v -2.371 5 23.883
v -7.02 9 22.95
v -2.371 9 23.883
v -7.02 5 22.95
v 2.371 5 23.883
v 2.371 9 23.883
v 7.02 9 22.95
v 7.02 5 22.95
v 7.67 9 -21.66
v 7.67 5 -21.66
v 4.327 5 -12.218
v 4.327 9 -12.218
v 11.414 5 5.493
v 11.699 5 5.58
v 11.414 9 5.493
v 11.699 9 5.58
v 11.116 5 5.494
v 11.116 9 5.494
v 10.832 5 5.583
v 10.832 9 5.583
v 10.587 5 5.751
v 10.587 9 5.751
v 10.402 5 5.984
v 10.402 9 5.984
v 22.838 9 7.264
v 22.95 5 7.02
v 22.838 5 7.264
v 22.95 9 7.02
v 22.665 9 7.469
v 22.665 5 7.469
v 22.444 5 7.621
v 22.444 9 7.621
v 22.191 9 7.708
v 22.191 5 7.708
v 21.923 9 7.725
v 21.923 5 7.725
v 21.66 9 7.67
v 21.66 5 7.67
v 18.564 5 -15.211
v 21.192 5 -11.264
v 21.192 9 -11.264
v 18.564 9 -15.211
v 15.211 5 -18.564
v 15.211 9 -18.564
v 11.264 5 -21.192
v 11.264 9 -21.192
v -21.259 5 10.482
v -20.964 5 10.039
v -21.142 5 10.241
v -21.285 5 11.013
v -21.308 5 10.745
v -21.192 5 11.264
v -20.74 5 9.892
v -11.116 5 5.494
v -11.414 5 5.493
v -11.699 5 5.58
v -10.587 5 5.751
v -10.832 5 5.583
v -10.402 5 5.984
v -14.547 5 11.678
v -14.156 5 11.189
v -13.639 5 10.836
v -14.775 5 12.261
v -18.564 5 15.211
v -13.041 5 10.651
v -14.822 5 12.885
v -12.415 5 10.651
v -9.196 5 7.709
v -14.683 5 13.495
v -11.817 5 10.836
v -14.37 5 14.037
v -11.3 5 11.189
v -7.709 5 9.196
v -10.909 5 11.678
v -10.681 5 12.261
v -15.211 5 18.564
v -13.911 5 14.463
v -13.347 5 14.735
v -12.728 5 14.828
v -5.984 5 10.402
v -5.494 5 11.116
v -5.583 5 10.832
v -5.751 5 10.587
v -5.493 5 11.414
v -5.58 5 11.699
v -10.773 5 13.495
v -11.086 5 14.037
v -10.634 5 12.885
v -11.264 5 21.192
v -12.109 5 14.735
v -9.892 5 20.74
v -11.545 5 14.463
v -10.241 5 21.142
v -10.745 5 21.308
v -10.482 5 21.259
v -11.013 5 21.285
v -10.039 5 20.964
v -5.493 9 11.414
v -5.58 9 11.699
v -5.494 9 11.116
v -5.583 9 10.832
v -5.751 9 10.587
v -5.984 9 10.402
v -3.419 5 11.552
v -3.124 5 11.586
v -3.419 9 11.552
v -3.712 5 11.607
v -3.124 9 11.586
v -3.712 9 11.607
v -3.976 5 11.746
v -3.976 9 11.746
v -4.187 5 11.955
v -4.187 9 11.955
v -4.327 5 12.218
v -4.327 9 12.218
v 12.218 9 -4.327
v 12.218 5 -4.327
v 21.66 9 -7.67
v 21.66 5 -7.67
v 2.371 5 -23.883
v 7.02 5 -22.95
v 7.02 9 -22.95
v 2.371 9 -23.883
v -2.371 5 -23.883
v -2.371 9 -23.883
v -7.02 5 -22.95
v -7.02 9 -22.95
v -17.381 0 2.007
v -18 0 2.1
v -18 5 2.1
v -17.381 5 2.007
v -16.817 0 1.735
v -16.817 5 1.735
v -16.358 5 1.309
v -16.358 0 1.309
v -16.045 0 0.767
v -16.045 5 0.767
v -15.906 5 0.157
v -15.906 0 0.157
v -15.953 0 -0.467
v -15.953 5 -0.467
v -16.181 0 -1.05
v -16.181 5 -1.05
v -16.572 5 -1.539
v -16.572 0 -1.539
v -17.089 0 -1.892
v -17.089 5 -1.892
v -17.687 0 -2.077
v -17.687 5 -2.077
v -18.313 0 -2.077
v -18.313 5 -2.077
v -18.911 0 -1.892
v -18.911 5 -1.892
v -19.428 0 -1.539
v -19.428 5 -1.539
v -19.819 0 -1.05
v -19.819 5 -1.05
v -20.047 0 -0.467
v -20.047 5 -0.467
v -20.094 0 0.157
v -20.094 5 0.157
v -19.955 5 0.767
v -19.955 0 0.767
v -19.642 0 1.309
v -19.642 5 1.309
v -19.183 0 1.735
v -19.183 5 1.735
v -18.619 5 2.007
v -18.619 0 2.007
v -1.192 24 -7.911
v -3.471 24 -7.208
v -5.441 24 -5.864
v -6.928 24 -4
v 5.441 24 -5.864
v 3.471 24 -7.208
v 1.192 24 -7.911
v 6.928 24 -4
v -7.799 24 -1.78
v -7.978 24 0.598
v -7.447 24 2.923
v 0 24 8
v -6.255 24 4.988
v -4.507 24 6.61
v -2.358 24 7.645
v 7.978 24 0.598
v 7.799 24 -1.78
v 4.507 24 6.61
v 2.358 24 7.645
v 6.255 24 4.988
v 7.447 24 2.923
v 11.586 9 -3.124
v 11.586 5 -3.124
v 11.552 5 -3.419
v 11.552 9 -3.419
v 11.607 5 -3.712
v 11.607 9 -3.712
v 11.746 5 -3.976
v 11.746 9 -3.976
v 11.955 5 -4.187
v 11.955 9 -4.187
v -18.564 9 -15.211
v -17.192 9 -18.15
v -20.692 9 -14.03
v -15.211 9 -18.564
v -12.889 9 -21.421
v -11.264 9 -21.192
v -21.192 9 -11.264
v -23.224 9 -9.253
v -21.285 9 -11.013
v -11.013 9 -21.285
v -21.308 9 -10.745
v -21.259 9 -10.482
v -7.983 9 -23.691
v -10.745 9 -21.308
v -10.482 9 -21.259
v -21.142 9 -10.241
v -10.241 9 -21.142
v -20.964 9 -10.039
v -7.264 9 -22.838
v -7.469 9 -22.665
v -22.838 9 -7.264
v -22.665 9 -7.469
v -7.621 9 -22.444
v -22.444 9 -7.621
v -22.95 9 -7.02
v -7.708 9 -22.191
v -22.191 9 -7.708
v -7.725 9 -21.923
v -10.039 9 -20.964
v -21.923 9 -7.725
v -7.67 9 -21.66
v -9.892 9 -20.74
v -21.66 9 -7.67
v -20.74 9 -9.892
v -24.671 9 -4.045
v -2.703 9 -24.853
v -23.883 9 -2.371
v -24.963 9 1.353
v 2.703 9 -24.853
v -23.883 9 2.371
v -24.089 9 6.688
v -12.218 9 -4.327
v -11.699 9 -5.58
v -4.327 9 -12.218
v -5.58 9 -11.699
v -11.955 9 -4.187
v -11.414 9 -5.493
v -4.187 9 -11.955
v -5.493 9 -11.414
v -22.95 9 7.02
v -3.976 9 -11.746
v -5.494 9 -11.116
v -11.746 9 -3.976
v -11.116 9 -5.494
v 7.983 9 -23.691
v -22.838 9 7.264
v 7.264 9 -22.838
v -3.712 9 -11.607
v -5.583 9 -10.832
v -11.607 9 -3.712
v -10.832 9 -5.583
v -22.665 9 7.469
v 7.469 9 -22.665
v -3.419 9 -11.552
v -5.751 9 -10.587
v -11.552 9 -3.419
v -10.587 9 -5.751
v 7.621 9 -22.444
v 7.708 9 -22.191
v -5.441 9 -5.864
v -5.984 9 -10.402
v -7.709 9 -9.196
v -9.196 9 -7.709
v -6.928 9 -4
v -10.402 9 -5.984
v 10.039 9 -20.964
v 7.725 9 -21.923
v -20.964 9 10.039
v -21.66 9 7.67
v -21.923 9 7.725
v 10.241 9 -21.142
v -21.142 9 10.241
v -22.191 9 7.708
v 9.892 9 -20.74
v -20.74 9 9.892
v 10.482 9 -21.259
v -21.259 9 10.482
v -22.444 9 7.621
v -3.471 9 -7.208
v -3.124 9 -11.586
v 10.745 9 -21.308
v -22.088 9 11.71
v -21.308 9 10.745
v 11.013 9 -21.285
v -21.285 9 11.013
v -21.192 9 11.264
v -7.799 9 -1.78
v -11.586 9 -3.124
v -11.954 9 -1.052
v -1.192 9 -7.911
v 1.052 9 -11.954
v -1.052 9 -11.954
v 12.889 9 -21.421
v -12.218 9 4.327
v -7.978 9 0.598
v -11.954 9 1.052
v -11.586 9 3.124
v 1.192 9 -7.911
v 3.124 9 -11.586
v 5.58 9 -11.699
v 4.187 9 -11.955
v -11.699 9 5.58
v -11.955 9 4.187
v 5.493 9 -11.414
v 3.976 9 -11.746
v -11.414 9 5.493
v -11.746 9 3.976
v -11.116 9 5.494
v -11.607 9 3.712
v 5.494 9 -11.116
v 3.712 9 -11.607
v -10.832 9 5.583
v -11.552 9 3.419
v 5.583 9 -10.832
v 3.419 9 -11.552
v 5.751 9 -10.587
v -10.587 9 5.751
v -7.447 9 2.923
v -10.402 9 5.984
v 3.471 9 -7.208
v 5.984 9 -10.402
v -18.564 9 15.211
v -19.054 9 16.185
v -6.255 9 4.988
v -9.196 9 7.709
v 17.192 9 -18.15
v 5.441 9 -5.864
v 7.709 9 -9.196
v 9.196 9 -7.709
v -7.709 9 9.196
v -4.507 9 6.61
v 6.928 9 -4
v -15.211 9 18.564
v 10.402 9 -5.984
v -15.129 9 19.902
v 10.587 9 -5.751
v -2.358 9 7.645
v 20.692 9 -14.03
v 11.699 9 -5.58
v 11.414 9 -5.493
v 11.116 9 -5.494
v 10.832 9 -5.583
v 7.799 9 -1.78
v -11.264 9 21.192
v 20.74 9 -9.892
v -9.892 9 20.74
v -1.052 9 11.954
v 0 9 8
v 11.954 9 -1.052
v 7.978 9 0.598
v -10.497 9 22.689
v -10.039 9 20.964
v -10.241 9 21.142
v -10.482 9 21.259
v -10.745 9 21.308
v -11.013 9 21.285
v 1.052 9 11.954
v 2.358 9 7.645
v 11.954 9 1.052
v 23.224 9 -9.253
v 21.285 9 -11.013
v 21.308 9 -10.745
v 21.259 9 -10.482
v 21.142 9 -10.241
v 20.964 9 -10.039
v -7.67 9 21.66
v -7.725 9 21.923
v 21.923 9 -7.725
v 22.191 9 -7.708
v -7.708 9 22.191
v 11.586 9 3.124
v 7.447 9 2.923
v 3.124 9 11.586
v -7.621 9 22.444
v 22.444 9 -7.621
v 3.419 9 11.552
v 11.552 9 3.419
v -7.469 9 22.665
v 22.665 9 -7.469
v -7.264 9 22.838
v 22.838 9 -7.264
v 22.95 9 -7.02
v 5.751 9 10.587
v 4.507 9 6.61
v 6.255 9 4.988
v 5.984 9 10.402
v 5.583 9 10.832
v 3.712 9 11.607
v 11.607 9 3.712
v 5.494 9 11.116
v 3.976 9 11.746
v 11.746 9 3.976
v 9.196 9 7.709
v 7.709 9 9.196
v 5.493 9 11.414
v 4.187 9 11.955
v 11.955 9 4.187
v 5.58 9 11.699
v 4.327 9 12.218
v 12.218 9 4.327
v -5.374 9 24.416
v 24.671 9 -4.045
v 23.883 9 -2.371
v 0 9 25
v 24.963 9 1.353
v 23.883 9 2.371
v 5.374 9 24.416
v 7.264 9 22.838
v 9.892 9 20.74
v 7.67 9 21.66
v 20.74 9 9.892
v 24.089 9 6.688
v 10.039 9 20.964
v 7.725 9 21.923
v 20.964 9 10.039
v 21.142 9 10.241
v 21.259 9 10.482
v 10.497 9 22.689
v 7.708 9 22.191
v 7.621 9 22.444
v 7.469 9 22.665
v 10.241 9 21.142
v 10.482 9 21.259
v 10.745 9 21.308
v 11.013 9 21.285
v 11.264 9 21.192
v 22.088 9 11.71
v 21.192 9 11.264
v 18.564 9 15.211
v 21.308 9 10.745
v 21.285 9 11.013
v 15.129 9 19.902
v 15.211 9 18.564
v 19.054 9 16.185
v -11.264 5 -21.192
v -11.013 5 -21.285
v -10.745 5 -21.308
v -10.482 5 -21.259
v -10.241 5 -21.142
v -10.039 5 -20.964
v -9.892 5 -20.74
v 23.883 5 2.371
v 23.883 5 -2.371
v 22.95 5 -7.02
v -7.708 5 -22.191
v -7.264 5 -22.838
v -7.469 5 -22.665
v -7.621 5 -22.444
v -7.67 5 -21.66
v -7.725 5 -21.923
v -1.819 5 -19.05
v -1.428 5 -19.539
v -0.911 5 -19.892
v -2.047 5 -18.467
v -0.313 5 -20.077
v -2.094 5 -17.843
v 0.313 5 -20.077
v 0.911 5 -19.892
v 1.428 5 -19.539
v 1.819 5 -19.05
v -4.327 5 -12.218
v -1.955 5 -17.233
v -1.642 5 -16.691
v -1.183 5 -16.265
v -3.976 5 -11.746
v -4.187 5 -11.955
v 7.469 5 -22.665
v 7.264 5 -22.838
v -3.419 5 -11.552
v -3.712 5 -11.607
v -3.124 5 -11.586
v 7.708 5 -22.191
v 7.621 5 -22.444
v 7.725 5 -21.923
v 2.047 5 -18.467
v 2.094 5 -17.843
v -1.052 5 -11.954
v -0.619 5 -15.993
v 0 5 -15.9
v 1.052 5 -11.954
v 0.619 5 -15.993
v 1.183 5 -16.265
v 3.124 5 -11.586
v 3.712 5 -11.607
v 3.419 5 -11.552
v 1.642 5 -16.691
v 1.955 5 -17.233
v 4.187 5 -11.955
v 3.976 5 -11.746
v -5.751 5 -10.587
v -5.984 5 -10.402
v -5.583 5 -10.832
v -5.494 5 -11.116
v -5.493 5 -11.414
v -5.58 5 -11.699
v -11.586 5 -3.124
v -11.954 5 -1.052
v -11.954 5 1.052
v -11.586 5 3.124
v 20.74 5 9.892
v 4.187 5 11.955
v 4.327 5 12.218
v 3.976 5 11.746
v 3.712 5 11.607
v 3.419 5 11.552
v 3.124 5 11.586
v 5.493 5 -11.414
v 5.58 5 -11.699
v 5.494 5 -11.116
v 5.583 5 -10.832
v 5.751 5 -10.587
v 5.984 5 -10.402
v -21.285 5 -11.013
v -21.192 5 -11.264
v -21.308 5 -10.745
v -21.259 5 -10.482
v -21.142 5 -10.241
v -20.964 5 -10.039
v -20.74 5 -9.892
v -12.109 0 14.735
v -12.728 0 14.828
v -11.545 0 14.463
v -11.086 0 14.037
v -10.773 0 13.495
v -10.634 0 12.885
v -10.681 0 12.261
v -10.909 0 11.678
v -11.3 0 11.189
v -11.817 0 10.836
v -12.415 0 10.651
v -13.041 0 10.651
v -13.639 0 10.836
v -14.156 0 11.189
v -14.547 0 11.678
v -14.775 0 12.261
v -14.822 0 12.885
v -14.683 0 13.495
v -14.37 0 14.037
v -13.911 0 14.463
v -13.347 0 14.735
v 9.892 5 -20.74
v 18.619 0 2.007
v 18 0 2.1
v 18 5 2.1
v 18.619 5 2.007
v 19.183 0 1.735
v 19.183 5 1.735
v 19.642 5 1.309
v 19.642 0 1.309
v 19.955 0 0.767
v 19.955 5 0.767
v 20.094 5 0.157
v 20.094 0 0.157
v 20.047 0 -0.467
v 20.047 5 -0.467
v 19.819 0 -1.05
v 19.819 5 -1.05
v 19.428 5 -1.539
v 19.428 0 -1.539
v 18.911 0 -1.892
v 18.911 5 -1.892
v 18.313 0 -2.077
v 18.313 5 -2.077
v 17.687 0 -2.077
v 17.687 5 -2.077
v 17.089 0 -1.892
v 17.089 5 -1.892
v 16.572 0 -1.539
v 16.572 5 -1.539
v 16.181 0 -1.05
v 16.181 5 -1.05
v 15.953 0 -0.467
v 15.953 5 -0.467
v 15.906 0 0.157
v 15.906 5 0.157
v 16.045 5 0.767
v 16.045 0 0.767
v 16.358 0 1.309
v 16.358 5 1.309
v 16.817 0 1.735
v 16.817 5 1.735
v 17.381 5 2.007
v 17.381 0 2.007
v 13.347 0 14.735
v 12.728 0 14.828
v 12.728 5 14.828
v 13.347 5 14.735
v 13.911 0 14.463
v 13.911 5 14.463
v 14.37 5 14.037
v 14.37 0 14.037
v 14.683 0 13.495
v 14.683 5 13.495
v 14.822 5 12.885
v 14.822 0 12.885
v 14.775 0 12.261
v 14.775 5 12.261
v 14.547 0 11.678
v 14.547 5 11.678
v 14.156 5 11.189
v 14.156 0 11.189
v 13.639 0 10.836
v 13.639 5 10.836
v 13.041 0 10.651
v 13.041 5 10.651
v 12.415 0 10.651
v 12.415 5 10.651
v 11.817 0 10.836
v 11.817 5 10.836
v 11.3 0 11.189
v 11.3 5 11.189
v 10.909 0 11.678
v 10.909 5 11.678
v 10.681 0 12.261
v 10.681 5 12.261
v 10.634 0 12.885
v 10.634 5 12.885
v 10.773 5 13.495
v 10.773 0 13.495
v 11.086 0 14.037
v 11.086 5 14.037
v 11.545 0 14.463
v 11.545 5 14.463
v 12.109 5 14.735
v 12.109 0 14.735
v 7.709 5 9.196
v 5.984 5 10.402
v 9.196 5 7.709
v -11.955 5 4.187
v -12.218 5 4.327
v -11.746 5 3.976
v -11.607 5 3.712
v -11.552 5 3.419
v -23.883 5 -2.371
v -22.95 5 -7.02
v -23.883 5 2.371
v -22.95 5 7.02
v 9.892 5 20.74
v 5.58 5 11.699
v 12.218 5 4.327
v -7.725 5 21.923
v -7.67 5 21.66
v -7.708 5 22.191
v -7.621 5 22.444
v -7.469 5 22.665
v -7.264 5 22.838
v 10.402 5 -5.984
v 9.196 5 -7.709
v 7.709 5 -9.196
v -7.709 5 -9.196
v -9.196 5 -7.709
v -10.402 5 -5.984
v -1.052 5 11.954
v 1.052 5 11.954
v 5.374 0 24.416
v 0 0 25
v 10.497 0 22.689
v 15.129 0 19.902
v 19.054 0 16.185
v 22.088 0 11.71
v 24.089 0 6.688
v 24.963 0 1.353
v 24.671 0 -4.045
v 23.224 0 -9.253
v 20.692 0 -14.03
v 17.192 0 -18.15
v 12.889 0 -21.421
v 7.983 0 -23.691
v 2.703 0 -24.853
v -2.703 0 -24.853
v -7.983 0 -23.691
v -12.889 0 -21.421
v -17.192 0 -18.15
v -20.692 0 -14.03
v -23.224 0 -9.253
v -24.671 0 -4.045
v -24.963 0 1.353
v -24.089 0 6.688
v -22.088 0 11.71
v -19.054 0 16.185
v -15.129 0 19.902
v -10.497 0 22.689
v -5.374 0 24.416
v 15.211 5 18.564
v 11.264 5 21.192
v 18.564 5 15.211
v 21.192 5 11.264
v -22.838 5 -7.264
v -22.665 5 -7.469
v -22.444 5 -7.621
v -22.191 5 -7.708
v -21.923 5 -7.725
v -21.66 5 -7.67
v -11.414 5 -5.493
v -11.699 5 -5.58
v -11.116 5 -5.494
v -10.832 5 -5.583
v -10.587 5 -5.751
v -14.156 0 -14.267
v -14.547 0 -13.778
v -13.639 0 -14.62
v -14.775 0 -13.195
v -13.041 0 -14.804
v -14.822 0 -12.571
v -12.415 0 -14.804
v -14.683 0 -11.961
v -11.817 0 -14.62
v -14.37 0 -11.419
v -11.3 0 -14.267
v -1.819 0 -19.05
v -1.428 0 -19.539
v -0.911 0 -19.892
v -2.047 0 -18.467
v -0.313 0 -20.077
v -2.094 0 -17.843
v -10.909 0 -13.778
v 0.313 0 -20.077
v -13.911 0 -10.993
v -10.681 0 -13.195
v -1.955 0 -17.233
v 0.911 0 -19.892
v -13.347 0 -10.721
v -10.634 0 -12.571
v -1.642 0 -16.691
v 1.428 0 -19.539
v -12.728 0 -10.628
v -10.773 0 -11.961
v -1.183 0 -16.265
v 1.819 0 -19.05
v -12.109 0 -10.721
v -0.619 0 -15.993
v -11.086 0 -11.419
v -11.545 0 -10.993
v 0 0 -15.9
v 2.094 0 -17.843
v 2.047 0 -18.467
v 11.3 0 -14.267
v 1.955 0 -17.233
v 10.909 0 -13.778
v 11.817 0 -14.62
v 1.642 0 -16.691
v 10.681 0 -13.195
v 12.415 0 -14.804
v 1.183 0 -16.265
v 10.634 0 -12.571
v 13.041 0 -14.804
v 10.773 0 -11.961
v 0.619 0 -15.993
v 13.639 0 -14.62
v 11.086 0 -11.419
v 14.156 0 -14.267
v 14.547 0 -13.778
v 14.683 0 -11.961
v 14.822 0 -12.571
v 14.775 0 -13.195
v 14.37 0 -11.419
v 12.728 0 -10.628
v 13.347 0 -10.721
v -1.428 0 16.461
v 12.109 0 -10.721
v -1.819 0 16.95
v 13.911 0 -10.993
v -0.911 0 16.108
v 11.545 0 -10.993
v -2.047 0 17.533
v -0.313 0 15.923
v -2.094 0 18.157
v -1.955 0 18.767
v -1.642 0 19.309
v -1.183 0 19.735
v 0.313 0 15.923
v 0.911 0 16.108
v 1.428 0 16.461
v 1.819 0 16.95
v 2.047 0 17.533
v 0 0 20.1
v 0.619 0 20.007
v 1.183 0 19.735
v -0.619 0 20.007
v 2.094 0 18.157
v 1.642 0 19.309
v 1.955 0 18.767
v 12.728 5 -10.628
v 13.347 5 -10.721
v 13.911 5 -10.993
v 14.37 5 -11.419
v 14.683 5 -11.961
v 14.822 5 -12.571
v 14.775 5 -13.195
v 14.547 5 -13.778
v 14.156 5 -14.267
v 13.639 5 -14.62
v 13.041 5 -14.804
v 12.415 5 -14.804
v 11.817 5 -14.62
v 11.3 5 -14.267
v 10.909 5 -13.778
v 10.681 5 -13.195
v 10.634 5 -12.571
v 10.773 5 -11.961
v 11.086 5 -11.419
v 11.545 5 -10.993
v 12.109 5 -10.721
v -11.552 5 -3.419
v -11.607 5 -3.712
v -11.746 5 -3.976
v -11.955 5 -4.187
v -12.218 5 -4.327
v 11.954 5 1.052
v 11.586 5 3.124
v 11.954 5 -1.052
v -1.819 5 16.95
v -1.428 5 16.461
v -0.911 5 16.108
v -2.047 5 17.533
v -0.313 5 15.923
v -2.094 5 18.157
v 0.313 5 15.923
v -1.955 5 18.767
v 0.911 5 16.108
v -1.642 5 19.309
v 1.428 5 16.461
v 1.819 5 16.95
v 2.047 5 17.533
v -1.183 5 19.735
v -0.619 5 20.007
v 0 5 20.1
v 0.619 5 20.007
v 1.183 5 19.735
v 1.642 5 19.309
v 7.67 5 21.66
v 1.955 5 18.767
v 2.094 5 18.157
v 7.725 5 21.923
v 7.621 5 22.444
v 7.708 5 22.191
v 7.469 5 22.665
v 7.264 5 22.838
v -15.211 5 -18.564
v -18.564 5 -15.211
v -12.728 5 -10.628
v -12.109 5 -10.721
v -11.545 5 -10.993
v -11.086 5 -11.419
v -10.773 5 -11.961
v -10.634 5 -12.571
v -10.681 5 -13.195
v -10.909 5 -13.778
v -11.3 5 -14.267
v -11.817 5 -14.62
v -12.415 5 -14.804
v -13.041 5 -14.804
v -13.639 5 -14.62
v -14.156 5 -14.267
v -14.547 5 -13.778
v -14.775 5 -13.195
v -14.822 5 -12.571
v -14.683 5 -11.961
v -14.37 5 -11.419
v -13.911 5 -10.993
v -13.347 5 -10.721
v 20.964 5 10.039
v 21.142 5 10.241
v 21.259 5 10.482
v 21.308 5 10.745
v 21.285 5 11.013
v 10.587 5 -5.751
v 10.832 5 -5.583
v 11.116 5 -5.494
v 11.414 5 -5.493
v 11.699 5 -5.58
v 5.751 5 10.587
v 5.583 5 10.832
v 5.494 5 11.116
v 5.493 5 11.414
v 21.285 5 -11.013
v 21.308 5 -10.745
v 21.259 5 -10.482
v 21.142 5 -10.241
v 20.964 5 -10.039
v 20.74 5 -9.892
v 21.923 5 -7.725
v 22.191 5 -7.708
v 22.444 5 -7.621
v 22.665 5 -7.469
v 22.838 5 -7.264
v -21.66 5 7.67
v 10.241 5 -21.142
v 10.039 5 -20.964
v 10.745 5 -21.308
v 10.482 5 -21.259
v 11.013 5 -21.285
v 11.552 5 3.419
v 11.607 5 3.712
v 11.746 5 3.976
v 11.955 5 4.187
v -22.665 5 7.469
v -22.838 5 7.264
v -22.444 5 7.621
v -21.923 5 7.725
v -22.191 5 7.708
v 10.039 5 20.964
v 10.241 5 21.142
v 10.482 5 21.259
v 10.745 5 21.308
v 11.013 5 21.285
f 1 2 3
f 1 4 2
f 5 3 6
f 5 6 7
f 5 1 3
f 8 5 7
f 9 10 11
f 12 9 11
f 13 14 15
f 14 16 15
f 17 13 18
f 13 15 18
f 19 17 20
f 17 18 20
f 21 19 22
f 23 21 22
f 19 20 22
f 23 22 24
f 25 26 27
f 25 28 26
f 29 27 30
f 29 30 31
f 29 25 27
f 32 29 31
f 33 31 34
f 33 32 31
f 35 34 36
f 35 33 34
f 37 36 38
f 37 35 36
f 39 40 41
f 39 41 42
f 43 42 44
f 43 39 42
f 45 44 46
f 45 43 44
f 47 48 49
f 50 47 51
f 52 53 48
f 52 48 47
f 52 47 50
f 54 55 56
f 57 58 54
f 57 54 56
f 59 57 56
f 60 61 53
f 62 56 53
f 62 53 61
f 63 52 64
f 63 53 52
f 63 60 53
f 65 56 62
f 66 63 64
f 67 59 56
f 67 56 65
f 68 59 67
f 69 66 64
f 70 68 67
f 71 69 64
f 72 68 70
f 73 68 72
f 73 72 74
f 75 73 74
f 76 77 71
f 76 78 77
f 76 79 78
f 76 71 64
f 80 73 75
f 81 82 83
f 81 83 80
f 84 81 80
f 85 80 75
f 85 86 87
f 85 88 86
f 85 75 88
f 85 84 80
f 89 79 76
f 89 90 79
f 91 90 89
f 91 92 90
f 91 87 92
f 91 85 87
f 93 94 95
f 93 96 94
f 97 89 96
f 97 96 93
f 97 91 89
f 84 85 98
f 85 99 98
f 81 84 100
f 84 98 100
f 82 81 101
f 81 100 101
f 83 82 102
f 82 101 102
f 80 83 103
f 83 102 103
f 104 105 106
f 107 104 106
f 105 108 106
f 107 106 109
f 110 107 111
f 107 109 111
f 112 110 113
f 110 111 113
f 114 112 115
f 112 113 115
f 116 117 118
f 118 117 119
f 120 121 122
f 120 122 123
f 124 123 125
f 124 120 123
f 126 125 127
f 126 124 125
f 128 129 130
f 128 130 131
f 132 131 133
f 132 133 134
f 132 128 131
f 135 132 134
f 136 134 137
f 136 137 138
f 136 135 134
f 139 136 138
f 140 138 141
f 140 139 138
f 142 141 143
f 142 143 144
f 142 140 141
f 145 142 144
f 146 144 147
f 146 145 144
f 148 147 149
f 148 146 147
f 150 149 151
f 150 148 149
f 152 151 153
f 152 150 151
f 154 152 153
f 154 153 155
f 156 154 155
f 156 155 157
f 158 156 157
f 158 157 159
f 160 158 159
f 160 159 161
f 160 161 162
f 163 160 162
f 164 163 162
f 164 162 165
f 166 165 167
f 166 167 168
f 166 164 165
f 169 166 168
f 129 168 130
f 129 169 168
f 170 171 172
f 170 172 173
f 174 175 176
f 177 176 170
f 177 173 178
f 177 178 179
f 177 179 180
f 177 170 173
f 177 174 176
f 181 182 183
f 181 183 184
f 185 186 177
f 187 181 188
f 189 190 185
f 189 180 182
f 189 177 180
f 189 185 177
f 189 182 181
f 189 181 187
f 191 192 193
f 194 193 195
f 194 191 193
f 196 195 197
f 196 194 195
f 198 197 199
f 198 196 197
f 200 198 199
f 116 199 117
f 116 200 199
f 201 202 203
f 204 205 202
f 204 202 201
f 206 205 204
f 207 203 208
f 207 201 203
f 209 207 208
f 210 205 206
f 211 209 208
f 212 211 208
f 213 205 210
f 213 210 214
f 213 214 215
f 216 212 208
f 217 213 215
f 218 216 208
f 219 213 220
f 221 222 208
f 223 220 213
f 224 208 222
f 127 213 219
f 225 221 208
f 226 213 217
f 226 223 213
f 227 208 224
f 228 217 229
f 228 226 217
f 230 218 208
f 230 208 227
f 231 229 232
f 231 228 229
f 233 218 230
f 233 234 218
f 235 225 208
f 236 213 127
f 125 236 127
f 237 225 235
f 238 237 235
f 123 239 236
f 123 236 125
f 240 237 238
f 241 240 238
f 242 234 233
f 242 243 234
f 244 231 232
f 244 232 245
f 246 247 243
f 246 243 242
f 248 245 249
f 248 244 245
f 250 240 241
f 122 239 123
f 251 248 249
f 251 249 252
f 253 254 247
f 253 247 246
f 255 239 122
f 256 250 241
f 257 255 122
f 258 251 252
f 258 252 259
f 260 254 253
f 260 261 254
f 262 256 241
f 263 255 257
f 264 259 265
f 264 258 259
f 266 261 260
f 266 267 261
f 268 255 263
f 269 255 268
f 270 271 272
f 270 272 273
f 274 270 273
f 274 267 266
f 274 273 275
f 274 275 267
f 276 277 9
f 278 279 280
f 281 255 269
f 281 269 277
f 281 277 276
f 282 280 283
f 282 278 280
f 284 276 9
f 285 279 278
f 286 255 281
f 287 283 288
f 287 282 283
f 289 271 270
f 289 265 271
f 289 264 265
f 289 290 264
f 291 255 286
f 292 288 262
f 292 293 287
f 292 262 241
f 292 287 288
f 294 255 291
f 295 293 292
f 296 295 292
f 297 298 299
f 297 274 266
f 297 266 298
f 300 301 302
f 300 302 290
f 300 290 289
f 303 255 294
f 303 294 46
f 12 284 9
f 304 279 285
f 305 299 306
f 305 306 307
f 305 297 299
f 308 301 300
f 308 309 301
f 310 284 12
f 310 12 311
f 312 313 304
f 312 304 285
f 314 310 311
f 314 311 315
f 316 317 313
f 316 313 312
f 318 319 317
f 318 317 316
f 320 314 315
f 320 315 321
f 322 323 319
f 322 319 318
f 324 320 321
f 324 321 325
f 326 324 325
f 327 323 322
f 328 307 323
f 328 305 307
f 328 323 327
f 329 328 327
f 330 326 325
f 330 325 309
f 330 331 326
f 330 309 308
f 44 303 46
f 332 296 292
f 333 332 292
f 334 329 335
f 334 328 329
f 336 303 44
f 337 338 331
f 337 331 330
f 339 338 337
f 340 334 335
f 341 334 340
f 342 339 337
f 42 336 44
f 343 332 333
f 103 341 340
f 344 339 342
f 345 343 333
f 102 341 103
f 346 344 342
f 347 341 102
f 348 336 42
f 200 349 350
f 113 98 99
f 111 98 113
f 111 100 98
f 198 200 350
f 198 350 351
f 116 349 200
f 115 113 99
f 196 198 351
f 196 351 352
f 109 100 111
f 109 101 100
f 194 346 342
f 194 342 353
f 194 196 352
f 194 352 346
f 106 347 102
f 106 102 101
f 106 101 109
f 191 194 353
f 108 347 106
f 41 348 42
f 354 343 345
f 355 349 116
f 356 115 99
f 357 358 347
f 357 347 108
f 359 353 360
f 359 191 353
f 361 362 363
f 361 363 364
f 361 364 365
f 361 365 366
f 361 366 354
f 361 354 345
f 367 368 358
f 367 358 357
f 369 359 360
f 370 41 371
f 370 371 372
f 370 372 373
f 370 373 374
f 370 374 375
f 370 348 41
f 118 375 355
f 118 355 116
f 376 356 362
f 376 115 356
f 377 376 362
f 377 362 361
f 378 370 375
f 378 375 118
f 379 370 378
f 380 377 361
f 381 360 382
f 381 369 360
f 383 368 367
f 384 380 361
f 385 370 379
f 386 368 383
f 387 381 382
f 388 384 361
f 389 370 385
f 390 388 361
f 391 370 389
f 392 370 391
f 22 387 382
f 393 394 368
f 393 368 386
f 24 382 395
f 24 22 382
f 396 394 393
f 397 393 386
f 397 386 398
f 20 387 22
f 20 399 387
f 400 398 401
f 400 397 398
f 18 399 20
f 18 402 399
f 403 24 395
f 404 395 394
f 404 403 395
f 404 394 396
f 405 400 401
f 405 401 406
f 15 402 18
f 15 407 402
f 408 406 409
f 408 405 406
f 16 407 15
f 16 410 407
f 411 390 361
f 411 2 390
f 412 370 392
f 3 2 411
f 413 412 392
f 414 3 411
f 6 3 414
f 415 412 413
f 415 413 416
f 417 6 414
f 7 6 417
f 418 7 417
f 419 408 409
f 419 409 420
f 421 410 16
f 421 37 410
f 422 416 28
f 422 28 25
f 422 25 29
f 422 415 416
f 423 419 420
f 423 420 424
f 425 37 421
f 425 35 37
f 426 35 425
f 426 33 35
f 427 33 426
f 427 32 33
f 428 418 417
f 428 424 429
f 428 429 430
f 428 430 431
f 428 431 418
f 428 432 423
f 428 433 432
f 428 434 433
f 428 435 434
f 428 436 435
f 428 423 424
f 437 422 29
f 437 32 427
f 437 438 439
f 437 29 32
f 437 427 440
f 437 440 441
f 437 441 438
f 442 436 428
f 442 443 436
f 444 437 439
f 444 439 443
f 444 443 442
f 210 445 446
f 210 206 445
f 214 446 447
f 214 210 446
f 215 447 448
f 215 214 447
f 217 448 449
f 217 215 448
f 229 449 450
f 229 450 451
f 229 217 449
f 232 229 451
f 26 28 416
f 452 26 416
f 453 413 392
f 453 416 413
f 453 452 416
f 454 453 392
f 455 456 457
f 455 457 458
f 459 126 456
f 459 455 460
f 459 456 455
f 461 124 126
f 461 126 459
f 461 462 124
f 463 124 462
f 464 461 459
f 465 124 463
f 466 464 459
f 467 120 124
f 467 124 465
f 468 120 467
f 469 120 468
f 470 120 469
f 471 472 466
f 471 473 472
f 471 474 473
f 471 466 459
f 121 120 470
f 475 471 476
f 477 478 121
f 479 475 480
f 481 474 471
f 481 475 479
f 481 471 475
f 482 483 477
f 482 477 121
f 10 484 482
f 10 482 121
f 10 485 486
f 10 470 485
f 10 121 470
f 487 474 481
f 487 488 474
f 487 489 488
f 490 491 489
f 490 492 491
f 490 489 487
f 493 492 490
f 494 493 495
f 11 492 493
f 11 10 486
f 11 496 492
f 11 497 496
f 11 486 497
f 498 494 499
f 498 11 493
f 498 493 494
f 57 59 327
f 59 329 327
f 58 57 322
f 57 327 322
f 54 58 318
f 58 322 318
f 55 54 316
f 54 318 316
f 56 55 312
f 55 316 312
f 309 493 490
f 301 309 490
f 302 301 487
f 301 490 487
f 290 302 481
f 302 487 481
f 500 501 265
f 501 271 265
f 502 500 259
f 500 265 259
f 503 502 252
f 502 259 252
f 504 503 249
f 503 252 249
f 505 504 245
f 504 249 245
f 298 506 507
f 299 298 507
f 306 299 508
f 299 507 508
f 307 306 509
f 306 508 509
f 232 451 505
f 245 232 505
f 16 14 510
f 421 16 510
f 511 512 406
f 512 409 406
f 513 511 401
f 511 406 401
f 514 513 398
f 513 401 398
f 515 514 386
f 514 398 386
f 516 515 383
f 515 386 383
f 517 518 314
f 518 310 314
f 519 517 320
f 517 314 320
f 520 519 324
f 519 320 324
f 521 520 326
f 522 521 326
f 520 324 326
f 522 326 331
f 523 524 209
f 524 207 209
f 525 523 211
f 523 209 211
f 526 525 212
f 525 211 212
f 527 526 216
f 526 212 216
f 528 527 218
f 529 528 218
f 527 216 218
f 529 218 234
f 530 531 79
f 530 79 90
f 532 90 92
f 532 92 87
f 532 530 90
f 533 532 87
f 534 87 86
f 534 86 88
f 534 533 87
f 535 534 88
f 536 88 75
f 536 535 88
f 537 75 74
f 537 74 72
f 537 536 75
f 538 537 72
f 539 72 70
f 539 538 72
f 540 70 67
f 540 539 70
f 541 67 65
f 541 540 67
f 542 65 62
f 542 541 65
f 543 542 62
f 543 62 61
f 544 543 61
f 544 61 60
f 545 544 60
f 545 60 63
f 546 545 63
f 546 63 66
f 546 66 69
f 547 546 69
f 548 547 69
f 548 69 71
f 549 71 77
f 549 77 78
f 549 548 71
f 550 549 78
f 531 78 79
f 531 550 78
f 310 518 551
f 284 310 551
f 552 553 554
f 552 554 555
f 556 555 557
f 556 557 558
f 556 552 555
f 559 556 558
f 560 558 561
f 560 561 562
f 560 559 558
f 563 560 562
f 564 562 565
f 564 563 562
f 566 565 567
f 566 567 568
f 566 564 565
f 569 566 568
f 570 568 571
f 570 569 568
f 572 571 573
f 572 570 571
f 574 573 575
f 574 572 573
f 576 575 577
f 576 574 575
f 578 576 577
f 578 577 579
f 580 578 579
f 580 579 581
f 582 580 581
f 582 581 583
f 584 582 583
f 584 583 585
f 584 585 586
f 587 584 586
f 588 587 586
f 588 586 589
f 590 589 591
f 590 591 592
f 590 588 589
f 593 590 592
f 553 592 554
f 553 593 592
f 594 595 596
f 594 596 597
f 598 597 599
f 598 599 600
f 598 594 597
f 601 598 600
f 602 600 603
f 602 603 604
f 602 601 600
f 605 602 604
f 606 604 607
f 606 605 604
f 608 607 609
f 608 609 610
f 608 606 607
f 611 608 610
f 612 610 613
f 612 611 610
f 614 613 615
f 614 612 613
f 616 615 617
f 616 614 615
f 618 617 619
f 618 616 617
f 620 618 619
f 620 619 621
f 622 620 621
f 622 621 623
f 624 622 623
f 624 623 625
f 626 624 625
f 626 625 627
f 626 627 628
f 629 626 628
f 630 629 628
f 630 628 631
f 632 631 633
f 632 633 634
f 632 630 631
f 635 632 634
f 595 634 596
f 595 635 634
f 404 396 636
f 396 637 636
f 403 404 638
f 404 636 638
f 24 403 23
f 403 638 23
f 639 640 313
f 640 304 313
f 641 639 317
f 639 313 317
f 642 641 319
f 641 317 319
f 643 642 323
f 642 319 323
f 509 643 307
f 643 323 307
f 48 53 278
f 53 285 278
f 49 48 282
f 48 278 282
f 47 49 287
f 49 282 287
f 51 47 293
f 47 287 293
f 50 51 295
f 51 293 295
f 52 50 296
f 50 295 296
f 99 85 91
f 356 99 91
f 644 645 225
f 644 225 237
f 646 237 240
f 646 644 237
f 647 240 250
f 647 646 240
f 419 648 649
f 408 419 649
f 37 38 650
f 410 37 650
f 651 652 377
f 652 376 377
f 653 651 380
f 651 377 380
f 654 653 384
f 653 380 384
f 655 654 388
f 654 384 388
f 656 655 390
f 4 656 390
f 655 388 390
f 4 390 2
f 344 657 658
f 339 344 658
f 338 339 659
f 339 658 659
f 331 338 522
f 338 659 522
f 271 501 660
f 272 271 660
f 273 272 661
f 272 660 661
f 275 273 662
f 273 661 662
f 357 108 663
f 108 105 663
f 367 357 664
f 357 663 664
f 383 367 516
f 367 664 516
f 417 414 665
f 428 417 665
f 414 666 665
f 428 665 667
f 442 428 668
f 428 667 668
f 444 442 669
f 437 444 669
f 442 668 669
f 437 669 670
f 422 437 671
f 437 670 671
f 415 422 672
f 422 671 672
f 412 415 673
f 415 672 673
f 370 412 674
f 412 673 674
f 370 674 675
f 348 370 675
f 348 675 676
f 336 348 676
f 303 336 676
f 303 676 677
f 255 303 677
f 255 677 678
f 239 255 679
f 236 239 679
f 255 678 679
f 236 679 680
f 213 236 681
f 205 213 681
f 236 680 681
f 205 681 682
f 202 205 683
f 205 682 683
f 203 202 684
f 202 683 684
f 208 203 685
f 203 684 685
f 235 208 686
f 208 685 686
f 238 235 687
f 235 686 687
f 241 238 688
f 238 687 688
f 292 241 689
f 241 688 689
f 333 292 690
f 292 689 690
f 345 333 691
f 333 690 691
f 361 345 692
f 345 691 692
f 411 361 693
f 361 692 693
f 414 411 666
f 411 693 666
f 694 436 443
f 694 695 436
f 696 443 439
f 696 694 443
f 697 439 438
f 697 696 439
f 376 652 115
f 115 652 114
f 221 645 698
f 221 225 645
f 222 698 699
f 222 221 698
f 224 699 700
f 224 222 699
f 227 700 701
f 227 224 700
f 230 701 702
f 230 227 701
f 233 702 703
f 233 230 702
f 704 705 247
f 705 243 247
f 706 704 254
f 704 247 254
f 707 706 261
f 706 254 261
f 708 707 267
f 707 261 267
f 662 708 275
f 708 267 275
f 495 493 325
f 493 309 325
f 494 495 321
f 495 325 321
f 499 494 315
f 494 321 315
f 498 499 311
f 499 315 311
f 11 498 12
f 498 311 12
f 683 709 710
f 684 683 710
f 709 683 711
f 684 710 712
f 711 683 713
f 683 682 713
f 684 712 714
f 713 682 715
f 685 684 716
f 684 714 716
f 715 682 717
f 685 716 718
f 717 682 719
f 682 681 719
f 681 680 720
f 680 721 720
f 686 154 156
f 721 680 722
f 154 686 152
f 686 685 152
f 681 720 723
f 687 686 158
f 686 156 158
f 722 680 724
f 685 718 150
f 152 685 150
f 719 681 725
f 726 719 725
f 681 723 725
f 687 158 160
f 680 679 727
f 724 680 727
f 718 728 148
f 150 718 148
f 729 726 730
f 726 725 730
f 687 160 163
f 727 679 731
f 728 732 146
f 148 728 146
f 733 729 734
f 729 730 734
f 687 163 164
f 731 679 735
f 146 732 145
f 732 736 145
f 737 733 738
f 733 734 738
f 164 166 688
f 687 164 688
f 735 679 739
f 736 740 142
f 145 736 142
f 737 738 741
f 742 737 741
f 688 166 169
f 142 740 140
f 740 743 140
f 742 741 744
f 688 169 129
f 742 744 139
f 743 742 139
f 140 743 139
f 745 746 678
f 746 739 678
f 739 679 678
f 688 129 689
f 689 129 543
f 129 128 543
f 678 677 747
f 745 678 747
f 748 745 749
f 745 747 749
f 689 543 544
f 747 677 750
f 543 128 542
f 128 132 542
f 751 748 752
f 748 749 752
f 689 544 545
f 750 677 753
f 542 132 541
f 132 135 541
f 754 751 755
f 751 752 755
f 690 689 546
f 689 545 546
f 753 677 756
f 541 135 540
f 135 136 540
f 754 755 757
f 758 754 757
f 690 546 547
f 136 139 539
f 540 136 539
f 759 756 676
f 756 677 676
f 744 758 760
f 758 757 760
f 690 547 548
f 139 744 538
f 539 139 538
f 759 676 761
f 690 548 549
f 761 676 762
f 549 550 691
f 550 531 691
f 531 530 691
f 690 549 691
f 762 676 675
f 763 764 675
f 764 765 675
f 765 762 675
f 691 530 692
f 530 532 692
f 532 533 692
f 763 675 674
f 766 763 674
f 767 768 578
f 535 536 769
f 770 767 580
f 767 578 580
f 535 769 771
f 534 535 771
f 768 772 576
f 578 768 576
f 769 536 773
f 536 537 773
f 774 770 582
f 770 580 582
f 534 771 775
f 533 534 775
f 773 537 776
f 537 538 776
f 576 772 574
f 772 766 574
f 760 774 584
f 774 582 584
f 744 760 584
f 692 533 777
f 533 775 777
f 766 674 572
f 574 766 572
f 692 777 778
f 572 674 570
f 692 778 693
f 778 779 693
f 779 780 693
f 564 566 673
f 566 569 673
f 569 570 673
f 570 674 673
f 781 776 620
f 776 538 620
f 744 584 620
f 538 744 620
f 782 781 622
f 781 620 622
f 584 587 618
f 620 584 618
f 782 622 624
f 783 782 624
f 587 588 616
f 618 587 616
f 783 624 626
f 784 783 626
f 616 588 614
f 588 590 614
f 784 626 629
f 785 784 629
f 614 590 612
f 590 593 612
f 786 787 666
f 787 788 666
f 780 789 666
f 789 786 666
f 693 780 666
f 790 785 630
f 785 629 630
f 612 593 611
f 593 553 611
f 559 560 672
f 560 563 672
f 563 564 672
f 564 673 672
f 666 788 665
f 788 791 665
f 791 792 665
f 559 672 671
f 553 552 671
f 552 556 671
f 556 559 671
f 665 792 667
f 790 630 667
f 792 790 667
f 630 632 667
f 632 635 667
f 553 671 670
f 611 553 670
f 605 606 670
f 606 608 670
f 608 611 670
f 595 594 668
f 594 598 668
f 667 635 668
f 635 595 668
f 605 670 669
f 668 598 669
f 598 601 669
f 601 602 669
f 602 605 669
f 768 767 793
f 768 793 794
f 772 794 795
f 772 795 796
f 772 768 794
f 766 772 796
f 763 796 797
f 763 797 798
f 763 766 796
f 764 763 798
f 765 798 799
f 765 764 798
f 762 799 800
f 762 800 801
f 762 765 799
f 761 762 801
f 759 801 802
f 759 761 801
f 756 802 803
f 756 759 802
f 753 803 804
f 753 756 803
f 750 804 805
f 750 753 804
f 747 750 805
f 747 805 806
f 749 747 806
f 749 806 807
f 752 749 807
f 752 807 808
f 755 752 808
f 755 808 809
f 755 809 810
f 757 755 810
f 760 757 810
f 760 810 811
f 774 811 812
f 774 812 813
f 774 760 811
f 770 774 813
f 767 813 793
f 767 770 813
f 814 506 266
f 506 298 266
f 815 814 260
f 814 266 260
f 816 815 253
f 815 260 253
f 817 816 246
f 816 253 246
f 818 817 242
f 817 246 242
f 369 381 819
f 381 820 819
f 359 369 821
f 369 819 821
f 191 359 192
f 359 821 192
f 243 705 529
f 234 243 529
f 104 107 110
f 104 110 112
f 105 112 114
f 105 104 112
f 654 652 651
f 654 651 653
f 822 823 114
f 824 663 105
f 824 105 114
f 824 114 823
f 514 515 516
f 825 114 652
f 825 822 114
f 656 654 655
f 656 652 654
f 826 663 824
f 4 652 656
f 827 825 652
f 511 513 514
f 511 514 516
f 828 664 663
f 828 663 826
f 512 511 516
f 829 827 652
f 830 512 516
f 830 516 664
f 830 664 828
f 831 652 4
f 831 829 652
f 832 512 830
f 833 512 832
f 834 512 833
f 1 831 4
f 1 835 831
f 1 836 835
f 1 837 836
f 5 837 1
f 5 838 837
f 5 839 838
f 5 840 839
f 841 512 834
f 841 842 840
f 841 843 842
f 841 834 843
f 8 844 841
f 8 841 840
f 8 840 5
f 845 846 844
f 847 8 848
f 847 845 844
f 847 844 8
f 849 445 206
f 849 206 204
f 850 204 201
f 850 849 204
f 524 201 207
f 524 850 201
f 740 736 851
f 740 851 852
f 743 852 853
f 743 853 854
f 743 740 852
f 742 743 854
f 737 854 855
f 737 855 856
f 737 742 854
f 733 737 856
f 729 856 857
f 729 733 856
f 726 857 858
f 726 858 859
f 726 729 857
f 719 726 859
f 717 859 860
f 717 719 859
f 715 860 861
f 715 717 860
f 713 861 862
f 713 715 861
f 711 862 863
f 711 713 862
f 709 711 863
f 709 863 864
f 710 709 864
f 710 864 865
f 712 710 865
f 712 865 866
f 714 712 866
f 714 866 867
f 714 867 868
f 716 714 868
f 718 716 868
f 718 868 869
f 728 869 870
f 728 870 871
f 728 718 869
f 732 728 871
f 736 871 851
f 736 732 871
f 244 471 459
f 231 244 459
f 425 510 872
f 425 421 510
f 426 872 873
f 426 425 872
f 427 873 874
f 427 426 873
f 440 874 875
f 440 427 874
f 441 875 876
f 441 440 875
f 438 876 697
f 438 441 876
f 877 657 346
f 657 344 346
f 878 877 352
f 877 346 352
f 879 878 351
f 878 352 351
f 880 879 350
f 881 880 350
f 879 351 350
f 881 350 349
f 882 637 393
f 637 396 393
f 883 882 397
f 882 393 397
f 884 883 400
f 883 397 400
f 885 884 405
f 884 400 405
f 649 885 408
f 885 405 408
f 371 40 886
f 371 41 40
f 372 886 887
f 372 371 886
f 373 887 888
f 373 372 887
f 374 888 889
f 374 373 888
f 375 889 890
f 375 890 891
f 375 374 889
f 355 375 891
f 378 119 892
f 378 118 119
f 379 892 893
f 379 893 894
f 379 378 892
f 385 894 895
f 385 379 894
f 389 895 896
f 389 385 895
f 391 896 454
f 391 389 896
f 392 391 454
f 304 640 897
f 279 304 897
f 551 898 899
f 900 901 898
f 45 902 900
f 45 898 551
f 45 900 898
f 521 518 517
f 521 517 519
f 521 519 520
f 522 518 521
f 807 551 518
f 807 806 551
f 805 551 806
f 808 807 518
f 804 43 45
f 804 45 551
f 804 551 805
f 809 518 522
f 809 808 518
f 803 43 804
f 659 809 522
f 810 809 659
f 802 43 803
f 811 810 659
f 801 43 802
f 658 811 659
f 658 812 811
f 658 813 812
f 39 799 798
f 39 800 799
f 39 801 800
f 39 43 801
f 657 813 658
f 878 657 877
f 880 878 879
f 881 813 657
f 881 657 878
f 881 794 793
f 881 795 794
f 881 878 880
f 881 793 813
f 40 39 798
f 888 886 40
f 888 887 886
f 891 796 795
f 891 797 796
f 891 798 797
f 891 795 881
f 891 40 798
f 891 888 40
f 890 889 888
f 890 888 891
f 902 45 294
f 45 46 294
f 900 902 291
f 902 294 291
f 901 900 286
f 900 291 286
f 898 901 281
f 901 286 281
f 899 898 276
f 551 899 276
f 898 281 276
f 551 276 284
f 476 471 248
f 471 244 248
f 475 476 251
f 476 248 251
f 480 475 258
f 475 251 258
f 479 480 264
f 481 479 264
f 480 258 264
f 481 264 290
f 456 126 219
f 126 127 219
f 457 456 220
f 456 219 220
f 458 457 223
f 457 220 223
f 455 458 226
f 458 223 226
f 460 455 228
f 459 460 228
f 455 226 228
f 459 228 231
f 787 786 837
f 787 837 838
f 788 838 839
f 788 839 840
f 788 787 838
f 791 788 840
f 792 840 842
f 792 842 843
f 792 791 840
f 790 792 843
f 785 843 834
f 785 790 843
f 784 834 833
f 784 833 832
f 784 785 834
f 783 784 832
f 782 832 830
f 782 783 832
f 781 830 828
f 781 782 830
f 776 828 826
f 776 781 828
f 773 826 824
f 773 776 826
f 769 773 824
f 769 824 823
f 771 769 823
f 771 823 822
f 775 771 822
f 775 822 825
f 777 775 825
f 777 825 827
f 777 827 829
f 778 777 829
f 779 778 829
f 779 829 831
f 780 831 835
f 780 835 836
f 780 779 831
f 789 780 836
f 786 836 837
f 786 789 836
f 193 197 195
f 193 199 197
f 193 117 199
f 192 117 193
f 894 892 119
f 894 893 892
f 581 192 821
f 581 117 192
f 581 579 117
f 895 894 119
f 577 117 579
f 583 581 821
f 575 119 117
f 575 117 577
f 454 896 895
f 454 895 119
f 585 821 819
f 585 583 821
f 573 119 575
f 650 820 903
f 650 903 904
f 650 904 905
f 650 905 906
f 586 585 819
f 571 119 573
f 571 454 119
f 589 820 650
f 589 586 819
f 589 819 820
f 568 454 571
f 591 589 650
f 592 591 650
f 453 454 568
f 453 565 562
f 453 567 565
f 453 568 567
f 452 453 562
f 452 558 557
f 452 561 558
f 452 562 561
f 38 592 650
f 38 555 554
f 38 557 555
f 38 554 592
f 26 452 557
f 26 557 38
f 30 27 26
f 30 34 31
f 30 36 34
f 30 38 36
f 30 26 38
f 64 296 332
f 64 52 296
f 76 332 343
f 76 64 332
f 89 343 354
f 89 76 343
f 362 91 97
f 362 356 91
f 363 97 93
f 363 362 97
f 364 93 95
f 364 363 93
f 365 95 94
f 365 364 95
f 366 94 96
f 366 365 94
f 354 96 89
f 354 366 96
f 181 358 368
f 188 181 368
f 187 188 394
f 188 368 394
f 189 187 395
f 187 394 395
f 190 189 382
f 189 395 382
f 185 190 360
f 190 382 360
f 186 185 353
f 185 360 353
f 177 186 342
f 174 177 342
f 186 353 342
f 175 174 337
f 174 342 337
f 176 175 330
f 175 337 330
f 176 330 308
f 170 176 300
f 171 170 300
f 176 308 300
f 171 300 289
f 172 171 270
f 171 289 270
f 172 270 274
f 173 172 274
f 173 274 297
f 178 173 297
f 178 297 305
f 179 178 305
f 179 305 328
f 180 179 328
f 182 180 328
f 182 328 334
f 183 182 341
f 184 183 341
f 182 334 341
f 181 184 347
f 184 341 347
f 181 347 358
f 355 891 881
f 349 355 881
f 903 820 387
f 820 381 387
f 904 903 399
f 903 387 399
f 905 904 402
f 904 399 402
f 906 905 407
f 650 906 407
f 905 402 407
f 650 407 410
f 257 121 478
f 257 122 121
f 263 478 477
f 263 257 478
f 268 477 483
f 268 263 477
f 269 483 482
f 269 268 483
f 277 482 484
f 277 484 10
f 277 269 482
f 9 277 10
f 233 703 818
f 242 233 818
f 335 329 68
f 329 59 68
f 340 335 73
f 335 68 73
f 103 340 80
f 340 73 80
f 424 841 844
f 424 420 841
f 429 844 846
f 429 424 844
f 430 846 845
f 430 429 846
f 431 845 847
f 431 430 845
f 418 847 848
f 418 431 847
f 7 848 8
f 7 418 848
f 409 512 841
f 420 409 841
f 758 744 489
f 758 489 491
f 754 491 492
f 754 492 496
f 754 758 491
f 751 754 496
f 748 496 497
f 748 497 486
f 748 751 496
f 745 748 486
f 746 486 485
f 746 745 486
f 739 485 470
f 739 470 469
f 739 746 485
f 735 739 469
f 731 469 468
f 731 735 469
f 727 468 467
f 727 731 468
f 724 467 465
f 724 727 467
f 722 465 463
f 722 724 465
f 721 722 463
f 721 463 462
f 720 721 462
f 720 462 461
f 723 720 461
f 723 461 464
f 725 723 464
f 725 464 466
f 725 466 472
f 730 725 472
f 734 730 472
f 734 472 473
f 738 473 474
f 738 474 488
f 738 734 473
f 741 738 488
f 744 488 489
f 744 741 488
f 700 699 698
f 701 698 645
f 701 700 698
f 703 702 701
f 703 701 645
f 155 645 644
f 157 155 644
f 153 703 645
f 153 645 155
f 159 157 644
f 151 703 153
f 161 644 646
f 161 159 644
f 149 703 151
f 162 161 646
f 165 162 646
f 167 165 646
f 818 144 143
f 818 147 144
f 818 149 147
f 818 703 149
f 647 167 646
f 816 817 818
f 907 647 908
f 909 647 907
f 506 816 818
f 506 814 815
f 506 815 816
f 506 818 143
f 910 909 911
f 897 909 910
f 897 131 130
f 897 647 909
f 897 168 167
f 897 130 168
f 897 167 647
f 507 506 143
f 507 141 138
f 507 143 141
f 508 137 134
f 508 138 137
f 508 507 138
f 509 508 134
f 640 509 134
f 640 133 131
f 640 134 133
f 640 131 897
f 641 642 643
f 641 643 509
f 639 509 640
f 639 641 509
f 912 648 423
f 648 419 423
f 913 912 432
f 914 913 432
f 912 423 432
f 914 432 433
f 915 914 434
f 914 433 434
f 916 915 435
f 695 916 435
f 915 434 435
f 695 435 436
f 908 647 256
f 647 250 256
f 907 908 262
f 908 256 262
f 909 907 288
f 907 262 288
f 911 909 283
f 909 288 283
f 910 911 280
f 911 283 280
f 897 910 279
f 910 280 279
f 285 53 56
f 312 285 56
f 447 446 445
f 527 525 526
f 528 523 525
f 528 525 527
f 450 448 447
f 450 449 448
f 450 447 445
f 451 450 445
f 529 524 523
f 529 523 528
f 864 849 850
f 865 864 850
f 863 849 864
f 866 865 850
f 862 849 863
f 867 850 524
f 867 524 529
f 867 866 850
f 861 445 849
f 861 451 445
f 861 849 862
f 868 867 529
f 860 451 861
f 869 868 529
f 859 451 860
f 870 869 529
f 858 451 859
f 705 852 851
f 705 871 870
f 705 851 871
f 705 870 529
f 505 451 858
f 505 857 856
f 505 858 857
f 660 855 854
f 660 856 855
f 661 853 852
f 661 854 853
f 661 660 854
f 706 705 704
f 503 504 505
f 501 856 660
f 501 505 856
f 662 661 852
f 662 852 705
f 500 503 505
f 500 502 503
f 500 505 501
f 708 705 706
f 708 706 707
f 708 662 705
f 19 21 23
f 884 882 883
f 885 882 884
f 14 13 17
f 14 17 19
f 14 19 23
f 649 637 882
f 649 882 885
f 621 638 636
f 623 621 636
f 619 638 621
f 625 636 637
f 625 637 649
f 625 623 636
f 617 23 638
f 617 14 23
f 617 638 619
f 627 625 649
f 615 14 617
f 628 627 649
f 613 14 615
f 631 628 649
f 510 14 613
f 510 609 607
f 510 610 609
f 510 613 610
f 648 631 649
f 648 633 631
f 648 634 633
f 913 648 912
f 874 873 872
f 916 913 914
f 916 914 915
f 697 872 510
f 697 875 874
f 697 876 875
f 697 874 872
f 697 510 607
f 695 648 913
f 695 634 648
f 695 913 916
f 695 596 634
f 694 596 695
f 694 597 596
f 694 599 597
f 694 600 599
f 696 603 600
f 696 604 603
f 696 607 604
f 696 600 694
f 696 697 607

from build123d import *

# Parameters (mm, degrees)
SKETCH_1_R      = 25
SKETCH_1_R_2    = 2.1
EXTRUDE_1_DEPTH = 5
SKETCH_2_R      = 25
SKETCH_2_R_2    = 24
SKETCH_2_R_3    = 12
EXTRUDE_2_DEPTH = 4
FILLET_1_R      = 1
SKETCH_3_R      = 8
EXTRUDE_3_DEPTH = 15


with BuildPart() as part:
    # Эскиз1 → Бобышка-Вытянуть1 (new body)
    with BuildSketch(Plane(origin=(0, 0, 0), x_dir=(1, 0, 0), z_dir=(0, 1, 0))):
        with Locations(Location((0, 0, 0), (0, 0, 270))):
            Circle(SKETCH_1_R)
        with Locations(Location((-18, 0, 0), (0, 0, 270))):
            Circle(SKETCH_1_R_2, mode=Mode.SUBTRACT)
        with Locations(Location((-12.727922061, 12.727922061, 0), (0, 0, 270))):
            Circle(SKETCH_1_R_2, mode=Mode.SUBTRACT)
        with Locations(Location((0, 18, 0), (0, 0, 270))):
            Circle(SKETCH_1_R_2, mode=Mode.SUBTRACT)
        with Locations(Location((12.727922061, 12.727922061, 0), (0, 0, 270))):
            Circle(SKETCH_1_R_2, mode=Mode.SUBTRACT)
        with Locations(Location((18, 0, 0), (0, 0, 270))):
            Circle(SKETCH_1_R_2, mode=Mode.SUBTRACT)
        with Locations(Location((12.727922061, -12.727922061, 0), (0, 0, 270))):
            Circle(SKETCH_1_R_2, mode=Mode.SUBTRACT)
        with Locations(Location((0, -18, 0), (0, 0, 270))):
            Circle(SKETCH_1_R_2, mode=Mode.SUBTRACT)
        with Locations(Location((-12.727922061, -12.727922061, 0), (0, 0, 270))):
            Circle(SKETCH_1_R_2, mode=Mode.SUBTRACT)
    extrude(amount=EXTRUDE_1_DEPTH)

    # Эскиз2 → Бобышка-Вытянуть2 (add)
    # profile 1 of 10: a face of its own
    with BuildSketch(Plane(origin=(0, 5, 0), x_dir=(1, 0, 0), z_dir=(0, 1, 0))):
        with Locations(Location((0, 0, 0), (0, 0, 270))):
            Circle(SKETCH_2_R)
        Circle(SKETCH_2_R_2, mode=Mode.SUBTRACT)
    # profile 2 of 10: a face of its own
    with BuildSketch(Plane(origin=(0, 5, 0), x_dir=(1, 0, 0), z_dir=(0, 1, 0))):
        Circle(SKETCH_2_R_3)
    # profile 3 of 10: a face of its own
    with BuildSketch(Plane(origin=(0, 5, 0), x_dir=(1, 0, 0), z_dir=(0, 1, 0))):
        with BuildLine():
            Line((-10.332266323, 21.662046824), (-5.166133162, 10.831023412))
            ThreePointArc((-5.166133162, 10.831023412), (-4.592201188, 11.08655439), (-4.005682311, 11.311697893))
            Line((-4.005682311, 11.311697893), (-8.011364622, 22.623395786))
            ThreePointArc((-8.011364622, 22.623395786), (-9.184402377, 22.17310878), (-10.332266323, 21.662046824))
        make_face()
    # profile 4 of 10: a face of its own
    with BuildSketch(Plane(origin=(0, 5, 0), x_dir=(1, 0, 0), z_dir=(0, 1, 0))):
        with BuildLine():
            Line((8.011364622, 22.623395786), (4.005682311, 11.311697893))
            ThreePointArc((4.005682311, 11.311697893), (4.592201188, 11.08655439), (5.166133162, 10.831023412))
            Line((5.166133162, 10.831023412), (10.332266323, 21.662046824))
            ThreePointArc((10.332266323, 21.662046824), (9.184402377, 22.17310878), (8.011364622, 22.623395786))
        make_face()
    # profile 5 of 10: a face of its own
    with BuildSketch(Plane(origin=(0, 5, 0), x_dir=(1, 0, 0), z_dir=(0, 1, 0))):
        with BuildLine():
            ThreePointArc((10.831023412, 5.166133162), (11.08655439, 4.592201188), (11.311697893, 4.005682311))
            Line((11.311697893, 4.005682311), (22.623395786, 8.011364622))
            ThreePointArc((22.623395786, 8.011364622), (22.17310878, 9.184402377), (21.662046824, 10.332266323))
            Line((21.662046824, 10.332266323), (10.831023412, 5.166133162))
        make_face()
    # profile 6 of 10: a face of its own
    with BuildSketch(Plane(origin=(0, 5, 0), x_dir=(1, 0, 0), z_dir=(0, 1, 0))):
        with BuildLine():
            ThreePointArc((11.311697893, -4.005682311), (11.08655439, -4.592201188), (10.831023412, -5.166133162))
            Line((10.831023412, -5.166133162), (21.662046824, -10.332266323))
            ThreePointArc((21.662046824, -10.332266323), (22.17310878, -9.184402377), (22.623395786, -8.011364622))
            Line((22.623395786, -8.011364622), (11.311697893, -4.005682311))
        make_face()
    # profile 7 of 10: a face of its own
    with BuildSketch(Plane(origin=(0, 5, 0), x_dir=(1, 0, 0), z_dir=(0, 1, 0))):
        with BuildLine():
            ThreePointArc((5.166133162, -10.831023412), (4.592201188, -11.08655439), (4.005682311, -11.311697893))
            Line((4.005682311, -11.311697893), (8.011364622, -22.623395786))
            ThreePointArc((8.011364622, -22.623395786), (9.184402377, -22.17310878), (10.332266323, -21.662046824))
            Line((10.332266323, -21.662046824), (5.166133162, -10.831023412))
        make_face()
    # profile 8 of 10: a face of its own
    with BuildSketch(Plane(origin=(0, 5, 0), x_dir=(1, 0, 0), z_dir=(0, 1, 0))):
        with BuildLine():
            ThreePointArc((-4.005682311, -11.311697893), (-4.592201188, -11.08655439), (-5.166133162, -10.831023412))
            Line((-5.166133162, -10.831023412), (-10.332266323, -21.662046824))
            ThreePointArc((-10.332266323, -21.662046824), (-9.184402377, -22.17310878), (-8.011364622, -22.623395786))
            Line((-8.011364622, -22.623395786), (-4.005682311, -11.311697893))
        make_face()
    # profile 9 of 10: a face of its own
    with BuildSketch(Plane(origin=(0, 5, 0), x_dir=(1, 0, 0), z_dir=(0, 1, 0))):
        with BuildLine():
            Line((-21.662046824, -10.332266323), (-10.831023412, -5.166133162))
            ThreePointArc((-10.831023412, -5.166133162), (-11.08655439, -4.592201188), (-11.311697893, -4.005682311))
            Line((-11.311697893, -4.005682311), (-22.623395786, -8.011364622))
            ThreePointArc((-22.623395786, -8.011364622), (-22.17310878, -9.184402377), (-21.662046824, -10.332266323))
        make_face()
    # profile 10 of 10: a face of its own
    with BuildSketch(Plane(origin=(0, 5, 0), x_dir=(1, 0, 0), z_dir=(0, 1, 0))):
        with BuildLine():
            Line((-22.623395786, 8.011364622), (-11.311697893, 4.005682311))
            ThreePointArc((-11.311697893, 4.005682311), (-11.08655439, 4.592201188), (-10.831023412, 5.166133162))
            Line((-10.831023412, 5.166133162), (-21.662046824, 10.332266323))
            ThreePointArc((-21.662046824, 10.332266323), (-22.17310878, 9.184402377), (-22.623395786, 8.011364622))
        make_face()
    extrude(amount=EXTRUDE_2_DEPTH)

    # Скругление1
    fillet_1_edges = [part.edges().sort_by_distance(p)[0] for p in [
        (5.166133162, 7, 10.831023412),
        (10.831023412, 7, 5.166133162),
        (21.662046824, 7, 10.332266323),
        (22.623395786, 7, 8.011364622),
        (11.311697893, 7, 4.005682311),
        (11.311697893, 7, -4.005682311),
        (21.662046824, 7, -10.332266323),
        (10.831023412, 7, -5.166133162),
        (5.166133162, 7, -10.831023412),
        (8.011364622, 7, -22.623395786),
        (4.005682311, 7, -11.311697893),
        (-4.005682311, 7, -11.311697893),
        (-10.332266323, 7, -21.662046824),
        (-5.166133162, 7, -10.831023412),
        (-10.831023412, 7, -5.166133162),
        (-22.623395786, 7, -8.011364622),
        (-11.311697893, 7, -4.005682311),
        (-11.311697893, 7, 4.005682311),
        (-21.662046824, 7, 10.332266323),
        (-10.831023412, 7, 5.166133162),
        (-5.166133162, 7, 10.831023412),
        (-8.011364622, 7, 22.623395786),
        (-4.005682311, 7, 11.311697893),
        (4.005682311, 7, 11.311697893),
        (10.332266323, 7, 21.662046824),
        (22.623395786, 7, -8.011364622),
        (10.332266323, 7, -21.662046824),
        (-8.011364622, 7, -22.623395786),
        (-21.662046824, 7, -10.332266323),
        (-22.623395786, 7, 8.011364622),
        (-10.332266323, 7, 21.662046824),
        (8.011364622, 7, 22.623395786),
    ]]
    fillet(fillet_1_edges, radius=FILLET_1_R)

    # Эскиз3 → Бобышка-Вытянуть3 (add)
    with BuildSketch(Plane(origin=(0, 9, 0), x_dir=(1, 0, 0), z_dir=(0, 1, 0))):
        with Locations(Location((0, 0, 0), (0, 0, 270))):
            Circle(SKETCH_3_R)
    extrude(amount=EXTRUDE_3_DEPTH)


solid = part.part
